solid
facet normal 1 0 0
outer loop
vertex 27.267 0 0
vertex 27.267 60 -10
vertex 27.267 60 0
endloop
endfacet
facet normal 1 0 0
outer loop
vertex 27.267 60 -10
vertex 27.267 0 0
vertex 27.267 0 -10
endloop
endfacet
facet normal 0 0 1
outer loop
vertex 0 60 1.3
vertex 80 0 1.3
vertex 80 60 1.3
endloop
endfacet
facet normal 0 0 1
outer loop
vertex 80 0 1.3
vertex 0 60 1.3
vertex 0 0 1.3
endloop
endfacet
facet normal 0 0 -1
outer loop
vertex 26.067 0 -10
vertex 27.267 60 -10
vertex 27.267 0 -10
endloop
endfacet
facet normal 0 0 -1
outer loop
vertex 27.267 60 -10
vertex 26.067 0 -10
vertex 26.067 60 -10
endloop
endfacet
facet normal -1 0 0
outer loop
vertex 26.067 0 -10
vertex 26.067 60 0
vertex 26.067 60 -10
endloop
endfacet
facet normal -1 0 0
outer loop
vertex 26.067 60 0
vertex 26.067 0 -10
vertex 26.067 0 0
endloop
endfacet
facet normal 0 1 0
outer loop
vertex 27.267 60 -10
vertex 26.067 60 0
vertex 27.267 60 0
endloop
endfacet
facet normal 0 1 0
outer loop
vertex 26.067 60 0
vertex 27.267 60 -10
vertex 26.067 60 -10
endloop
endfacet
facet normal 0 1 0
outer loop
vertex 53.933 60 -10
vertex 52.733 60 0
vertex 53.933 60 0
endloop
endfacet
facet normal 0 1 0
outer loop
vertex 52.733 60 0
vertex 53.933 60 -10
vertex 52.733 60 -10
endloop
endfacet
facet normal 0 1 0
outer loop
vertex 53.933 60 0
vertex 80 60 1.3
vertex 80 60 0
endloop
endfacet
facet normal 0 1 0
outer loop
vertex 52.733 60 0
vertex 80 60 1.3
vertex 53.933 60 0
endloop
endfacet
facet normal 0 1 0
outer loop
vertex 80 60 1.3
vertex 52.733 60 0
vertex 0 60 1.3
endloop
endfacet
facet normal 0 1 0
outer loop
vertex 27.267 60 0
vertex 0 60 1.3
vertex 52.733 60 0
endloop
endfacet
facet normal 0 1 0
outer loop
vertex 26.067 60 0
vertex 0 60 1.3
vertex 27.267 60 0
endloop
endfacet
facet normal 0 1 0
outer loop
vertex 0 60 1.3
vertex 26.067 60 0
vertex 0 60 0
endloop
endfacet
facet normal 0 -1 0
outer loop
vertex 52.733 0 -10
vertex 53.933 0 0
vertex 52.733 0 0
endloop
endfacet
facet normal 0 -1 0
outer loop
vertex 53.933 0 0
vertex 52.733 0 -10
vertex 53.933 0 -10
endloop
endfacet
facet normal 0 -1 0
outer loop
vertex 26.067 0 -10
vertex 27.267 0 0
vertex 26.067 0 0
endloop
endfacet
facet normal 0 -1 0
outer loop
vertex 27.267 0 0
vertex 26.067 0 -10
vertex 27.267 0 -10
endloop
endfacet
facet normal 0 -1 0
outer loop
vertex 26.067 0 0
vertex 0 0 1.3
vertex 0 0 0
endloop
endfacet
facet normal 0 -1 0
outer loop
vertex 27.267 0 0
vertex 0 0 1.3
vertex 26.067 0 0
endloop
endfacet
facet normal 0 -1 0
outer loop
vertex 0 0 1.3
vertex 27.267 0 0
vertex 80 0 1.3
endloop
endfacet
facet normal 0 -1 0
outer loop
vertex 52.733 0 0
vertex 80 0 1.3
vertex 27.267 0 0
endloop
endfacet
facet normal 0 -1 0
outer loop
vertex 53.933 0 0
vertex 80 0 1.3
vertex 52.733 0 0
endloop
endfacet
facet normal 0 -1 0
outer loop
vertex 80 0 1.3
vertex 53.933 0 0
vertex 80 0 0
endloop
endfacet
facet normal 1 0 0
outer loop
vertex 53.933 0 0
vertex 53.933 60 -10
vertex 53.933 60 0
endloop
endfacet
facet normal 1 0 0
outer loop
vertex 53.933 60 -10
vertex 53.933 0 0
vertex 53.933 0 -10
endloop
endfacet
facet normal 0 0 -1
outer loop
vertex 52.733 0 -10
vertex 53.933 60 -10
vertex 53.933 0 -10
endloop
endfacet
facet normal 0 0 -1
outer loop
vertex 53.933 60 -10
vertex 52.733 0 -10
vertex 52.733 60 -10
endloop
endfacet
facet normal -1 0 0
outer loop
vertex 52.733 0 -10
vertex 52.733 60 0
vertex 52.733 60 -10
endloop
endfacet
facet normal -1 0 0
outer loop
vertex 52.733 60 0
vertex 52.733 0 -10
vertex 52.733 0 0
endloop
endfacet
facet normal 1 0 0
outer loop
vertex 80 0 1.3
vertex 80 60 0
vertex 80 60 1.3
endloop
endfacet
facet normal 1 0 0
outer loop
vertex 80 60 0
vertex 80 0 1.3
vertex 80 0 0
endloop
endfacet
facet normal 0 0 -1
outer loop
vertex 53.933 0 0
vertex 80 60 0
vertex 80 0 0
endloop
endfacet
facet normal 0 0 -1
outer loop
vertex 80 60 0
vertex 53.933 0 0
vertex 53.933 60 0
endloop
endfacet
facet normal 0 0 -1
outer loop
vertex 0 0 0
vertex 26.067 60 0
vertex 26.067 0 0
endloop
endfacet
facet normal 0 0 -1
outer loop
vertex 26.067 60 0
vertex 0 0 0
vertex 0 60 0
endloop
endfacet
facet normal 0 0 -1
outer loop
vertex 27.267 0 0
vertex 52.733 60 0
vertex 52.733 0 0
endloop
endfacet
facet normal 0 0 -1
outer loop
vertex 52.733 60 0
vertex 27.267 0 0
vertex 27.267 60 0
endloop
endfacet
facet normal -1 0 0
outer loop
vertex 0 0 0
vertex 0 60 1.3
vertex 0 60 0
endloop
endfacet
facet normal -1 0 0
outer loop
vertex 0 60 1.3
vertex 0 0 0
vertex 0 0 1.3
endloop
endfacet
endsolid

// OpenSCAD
$fn = 32;

// ----------------------------------------------------------------------
// Ribbed panel: 1.3 mm panel
// ----------------------------------------------------------------------

// --- parameters (mm) ---
panel_l = 80;             // panel length, X
panel_w = 60;             // panel width, Y
panel_t = 1.3;            // panel thickness, Z
rib_t = 1.2;              // rib thickness
rib_h = 10;               // rib height below the panel
ribs = 2;                 // number of ribs

total_h = panel_t + rib_h;  // overall height

union() {
  cube([panel_l, panel_w, panel_t]);
  for (i = [1 : ribs])
    translate([i * panel_l / (ribs + 1) - rib_t / 2, 0, -rib_h])
      cube([rib_t, panel_w, rib_h + panel_t]);
}
